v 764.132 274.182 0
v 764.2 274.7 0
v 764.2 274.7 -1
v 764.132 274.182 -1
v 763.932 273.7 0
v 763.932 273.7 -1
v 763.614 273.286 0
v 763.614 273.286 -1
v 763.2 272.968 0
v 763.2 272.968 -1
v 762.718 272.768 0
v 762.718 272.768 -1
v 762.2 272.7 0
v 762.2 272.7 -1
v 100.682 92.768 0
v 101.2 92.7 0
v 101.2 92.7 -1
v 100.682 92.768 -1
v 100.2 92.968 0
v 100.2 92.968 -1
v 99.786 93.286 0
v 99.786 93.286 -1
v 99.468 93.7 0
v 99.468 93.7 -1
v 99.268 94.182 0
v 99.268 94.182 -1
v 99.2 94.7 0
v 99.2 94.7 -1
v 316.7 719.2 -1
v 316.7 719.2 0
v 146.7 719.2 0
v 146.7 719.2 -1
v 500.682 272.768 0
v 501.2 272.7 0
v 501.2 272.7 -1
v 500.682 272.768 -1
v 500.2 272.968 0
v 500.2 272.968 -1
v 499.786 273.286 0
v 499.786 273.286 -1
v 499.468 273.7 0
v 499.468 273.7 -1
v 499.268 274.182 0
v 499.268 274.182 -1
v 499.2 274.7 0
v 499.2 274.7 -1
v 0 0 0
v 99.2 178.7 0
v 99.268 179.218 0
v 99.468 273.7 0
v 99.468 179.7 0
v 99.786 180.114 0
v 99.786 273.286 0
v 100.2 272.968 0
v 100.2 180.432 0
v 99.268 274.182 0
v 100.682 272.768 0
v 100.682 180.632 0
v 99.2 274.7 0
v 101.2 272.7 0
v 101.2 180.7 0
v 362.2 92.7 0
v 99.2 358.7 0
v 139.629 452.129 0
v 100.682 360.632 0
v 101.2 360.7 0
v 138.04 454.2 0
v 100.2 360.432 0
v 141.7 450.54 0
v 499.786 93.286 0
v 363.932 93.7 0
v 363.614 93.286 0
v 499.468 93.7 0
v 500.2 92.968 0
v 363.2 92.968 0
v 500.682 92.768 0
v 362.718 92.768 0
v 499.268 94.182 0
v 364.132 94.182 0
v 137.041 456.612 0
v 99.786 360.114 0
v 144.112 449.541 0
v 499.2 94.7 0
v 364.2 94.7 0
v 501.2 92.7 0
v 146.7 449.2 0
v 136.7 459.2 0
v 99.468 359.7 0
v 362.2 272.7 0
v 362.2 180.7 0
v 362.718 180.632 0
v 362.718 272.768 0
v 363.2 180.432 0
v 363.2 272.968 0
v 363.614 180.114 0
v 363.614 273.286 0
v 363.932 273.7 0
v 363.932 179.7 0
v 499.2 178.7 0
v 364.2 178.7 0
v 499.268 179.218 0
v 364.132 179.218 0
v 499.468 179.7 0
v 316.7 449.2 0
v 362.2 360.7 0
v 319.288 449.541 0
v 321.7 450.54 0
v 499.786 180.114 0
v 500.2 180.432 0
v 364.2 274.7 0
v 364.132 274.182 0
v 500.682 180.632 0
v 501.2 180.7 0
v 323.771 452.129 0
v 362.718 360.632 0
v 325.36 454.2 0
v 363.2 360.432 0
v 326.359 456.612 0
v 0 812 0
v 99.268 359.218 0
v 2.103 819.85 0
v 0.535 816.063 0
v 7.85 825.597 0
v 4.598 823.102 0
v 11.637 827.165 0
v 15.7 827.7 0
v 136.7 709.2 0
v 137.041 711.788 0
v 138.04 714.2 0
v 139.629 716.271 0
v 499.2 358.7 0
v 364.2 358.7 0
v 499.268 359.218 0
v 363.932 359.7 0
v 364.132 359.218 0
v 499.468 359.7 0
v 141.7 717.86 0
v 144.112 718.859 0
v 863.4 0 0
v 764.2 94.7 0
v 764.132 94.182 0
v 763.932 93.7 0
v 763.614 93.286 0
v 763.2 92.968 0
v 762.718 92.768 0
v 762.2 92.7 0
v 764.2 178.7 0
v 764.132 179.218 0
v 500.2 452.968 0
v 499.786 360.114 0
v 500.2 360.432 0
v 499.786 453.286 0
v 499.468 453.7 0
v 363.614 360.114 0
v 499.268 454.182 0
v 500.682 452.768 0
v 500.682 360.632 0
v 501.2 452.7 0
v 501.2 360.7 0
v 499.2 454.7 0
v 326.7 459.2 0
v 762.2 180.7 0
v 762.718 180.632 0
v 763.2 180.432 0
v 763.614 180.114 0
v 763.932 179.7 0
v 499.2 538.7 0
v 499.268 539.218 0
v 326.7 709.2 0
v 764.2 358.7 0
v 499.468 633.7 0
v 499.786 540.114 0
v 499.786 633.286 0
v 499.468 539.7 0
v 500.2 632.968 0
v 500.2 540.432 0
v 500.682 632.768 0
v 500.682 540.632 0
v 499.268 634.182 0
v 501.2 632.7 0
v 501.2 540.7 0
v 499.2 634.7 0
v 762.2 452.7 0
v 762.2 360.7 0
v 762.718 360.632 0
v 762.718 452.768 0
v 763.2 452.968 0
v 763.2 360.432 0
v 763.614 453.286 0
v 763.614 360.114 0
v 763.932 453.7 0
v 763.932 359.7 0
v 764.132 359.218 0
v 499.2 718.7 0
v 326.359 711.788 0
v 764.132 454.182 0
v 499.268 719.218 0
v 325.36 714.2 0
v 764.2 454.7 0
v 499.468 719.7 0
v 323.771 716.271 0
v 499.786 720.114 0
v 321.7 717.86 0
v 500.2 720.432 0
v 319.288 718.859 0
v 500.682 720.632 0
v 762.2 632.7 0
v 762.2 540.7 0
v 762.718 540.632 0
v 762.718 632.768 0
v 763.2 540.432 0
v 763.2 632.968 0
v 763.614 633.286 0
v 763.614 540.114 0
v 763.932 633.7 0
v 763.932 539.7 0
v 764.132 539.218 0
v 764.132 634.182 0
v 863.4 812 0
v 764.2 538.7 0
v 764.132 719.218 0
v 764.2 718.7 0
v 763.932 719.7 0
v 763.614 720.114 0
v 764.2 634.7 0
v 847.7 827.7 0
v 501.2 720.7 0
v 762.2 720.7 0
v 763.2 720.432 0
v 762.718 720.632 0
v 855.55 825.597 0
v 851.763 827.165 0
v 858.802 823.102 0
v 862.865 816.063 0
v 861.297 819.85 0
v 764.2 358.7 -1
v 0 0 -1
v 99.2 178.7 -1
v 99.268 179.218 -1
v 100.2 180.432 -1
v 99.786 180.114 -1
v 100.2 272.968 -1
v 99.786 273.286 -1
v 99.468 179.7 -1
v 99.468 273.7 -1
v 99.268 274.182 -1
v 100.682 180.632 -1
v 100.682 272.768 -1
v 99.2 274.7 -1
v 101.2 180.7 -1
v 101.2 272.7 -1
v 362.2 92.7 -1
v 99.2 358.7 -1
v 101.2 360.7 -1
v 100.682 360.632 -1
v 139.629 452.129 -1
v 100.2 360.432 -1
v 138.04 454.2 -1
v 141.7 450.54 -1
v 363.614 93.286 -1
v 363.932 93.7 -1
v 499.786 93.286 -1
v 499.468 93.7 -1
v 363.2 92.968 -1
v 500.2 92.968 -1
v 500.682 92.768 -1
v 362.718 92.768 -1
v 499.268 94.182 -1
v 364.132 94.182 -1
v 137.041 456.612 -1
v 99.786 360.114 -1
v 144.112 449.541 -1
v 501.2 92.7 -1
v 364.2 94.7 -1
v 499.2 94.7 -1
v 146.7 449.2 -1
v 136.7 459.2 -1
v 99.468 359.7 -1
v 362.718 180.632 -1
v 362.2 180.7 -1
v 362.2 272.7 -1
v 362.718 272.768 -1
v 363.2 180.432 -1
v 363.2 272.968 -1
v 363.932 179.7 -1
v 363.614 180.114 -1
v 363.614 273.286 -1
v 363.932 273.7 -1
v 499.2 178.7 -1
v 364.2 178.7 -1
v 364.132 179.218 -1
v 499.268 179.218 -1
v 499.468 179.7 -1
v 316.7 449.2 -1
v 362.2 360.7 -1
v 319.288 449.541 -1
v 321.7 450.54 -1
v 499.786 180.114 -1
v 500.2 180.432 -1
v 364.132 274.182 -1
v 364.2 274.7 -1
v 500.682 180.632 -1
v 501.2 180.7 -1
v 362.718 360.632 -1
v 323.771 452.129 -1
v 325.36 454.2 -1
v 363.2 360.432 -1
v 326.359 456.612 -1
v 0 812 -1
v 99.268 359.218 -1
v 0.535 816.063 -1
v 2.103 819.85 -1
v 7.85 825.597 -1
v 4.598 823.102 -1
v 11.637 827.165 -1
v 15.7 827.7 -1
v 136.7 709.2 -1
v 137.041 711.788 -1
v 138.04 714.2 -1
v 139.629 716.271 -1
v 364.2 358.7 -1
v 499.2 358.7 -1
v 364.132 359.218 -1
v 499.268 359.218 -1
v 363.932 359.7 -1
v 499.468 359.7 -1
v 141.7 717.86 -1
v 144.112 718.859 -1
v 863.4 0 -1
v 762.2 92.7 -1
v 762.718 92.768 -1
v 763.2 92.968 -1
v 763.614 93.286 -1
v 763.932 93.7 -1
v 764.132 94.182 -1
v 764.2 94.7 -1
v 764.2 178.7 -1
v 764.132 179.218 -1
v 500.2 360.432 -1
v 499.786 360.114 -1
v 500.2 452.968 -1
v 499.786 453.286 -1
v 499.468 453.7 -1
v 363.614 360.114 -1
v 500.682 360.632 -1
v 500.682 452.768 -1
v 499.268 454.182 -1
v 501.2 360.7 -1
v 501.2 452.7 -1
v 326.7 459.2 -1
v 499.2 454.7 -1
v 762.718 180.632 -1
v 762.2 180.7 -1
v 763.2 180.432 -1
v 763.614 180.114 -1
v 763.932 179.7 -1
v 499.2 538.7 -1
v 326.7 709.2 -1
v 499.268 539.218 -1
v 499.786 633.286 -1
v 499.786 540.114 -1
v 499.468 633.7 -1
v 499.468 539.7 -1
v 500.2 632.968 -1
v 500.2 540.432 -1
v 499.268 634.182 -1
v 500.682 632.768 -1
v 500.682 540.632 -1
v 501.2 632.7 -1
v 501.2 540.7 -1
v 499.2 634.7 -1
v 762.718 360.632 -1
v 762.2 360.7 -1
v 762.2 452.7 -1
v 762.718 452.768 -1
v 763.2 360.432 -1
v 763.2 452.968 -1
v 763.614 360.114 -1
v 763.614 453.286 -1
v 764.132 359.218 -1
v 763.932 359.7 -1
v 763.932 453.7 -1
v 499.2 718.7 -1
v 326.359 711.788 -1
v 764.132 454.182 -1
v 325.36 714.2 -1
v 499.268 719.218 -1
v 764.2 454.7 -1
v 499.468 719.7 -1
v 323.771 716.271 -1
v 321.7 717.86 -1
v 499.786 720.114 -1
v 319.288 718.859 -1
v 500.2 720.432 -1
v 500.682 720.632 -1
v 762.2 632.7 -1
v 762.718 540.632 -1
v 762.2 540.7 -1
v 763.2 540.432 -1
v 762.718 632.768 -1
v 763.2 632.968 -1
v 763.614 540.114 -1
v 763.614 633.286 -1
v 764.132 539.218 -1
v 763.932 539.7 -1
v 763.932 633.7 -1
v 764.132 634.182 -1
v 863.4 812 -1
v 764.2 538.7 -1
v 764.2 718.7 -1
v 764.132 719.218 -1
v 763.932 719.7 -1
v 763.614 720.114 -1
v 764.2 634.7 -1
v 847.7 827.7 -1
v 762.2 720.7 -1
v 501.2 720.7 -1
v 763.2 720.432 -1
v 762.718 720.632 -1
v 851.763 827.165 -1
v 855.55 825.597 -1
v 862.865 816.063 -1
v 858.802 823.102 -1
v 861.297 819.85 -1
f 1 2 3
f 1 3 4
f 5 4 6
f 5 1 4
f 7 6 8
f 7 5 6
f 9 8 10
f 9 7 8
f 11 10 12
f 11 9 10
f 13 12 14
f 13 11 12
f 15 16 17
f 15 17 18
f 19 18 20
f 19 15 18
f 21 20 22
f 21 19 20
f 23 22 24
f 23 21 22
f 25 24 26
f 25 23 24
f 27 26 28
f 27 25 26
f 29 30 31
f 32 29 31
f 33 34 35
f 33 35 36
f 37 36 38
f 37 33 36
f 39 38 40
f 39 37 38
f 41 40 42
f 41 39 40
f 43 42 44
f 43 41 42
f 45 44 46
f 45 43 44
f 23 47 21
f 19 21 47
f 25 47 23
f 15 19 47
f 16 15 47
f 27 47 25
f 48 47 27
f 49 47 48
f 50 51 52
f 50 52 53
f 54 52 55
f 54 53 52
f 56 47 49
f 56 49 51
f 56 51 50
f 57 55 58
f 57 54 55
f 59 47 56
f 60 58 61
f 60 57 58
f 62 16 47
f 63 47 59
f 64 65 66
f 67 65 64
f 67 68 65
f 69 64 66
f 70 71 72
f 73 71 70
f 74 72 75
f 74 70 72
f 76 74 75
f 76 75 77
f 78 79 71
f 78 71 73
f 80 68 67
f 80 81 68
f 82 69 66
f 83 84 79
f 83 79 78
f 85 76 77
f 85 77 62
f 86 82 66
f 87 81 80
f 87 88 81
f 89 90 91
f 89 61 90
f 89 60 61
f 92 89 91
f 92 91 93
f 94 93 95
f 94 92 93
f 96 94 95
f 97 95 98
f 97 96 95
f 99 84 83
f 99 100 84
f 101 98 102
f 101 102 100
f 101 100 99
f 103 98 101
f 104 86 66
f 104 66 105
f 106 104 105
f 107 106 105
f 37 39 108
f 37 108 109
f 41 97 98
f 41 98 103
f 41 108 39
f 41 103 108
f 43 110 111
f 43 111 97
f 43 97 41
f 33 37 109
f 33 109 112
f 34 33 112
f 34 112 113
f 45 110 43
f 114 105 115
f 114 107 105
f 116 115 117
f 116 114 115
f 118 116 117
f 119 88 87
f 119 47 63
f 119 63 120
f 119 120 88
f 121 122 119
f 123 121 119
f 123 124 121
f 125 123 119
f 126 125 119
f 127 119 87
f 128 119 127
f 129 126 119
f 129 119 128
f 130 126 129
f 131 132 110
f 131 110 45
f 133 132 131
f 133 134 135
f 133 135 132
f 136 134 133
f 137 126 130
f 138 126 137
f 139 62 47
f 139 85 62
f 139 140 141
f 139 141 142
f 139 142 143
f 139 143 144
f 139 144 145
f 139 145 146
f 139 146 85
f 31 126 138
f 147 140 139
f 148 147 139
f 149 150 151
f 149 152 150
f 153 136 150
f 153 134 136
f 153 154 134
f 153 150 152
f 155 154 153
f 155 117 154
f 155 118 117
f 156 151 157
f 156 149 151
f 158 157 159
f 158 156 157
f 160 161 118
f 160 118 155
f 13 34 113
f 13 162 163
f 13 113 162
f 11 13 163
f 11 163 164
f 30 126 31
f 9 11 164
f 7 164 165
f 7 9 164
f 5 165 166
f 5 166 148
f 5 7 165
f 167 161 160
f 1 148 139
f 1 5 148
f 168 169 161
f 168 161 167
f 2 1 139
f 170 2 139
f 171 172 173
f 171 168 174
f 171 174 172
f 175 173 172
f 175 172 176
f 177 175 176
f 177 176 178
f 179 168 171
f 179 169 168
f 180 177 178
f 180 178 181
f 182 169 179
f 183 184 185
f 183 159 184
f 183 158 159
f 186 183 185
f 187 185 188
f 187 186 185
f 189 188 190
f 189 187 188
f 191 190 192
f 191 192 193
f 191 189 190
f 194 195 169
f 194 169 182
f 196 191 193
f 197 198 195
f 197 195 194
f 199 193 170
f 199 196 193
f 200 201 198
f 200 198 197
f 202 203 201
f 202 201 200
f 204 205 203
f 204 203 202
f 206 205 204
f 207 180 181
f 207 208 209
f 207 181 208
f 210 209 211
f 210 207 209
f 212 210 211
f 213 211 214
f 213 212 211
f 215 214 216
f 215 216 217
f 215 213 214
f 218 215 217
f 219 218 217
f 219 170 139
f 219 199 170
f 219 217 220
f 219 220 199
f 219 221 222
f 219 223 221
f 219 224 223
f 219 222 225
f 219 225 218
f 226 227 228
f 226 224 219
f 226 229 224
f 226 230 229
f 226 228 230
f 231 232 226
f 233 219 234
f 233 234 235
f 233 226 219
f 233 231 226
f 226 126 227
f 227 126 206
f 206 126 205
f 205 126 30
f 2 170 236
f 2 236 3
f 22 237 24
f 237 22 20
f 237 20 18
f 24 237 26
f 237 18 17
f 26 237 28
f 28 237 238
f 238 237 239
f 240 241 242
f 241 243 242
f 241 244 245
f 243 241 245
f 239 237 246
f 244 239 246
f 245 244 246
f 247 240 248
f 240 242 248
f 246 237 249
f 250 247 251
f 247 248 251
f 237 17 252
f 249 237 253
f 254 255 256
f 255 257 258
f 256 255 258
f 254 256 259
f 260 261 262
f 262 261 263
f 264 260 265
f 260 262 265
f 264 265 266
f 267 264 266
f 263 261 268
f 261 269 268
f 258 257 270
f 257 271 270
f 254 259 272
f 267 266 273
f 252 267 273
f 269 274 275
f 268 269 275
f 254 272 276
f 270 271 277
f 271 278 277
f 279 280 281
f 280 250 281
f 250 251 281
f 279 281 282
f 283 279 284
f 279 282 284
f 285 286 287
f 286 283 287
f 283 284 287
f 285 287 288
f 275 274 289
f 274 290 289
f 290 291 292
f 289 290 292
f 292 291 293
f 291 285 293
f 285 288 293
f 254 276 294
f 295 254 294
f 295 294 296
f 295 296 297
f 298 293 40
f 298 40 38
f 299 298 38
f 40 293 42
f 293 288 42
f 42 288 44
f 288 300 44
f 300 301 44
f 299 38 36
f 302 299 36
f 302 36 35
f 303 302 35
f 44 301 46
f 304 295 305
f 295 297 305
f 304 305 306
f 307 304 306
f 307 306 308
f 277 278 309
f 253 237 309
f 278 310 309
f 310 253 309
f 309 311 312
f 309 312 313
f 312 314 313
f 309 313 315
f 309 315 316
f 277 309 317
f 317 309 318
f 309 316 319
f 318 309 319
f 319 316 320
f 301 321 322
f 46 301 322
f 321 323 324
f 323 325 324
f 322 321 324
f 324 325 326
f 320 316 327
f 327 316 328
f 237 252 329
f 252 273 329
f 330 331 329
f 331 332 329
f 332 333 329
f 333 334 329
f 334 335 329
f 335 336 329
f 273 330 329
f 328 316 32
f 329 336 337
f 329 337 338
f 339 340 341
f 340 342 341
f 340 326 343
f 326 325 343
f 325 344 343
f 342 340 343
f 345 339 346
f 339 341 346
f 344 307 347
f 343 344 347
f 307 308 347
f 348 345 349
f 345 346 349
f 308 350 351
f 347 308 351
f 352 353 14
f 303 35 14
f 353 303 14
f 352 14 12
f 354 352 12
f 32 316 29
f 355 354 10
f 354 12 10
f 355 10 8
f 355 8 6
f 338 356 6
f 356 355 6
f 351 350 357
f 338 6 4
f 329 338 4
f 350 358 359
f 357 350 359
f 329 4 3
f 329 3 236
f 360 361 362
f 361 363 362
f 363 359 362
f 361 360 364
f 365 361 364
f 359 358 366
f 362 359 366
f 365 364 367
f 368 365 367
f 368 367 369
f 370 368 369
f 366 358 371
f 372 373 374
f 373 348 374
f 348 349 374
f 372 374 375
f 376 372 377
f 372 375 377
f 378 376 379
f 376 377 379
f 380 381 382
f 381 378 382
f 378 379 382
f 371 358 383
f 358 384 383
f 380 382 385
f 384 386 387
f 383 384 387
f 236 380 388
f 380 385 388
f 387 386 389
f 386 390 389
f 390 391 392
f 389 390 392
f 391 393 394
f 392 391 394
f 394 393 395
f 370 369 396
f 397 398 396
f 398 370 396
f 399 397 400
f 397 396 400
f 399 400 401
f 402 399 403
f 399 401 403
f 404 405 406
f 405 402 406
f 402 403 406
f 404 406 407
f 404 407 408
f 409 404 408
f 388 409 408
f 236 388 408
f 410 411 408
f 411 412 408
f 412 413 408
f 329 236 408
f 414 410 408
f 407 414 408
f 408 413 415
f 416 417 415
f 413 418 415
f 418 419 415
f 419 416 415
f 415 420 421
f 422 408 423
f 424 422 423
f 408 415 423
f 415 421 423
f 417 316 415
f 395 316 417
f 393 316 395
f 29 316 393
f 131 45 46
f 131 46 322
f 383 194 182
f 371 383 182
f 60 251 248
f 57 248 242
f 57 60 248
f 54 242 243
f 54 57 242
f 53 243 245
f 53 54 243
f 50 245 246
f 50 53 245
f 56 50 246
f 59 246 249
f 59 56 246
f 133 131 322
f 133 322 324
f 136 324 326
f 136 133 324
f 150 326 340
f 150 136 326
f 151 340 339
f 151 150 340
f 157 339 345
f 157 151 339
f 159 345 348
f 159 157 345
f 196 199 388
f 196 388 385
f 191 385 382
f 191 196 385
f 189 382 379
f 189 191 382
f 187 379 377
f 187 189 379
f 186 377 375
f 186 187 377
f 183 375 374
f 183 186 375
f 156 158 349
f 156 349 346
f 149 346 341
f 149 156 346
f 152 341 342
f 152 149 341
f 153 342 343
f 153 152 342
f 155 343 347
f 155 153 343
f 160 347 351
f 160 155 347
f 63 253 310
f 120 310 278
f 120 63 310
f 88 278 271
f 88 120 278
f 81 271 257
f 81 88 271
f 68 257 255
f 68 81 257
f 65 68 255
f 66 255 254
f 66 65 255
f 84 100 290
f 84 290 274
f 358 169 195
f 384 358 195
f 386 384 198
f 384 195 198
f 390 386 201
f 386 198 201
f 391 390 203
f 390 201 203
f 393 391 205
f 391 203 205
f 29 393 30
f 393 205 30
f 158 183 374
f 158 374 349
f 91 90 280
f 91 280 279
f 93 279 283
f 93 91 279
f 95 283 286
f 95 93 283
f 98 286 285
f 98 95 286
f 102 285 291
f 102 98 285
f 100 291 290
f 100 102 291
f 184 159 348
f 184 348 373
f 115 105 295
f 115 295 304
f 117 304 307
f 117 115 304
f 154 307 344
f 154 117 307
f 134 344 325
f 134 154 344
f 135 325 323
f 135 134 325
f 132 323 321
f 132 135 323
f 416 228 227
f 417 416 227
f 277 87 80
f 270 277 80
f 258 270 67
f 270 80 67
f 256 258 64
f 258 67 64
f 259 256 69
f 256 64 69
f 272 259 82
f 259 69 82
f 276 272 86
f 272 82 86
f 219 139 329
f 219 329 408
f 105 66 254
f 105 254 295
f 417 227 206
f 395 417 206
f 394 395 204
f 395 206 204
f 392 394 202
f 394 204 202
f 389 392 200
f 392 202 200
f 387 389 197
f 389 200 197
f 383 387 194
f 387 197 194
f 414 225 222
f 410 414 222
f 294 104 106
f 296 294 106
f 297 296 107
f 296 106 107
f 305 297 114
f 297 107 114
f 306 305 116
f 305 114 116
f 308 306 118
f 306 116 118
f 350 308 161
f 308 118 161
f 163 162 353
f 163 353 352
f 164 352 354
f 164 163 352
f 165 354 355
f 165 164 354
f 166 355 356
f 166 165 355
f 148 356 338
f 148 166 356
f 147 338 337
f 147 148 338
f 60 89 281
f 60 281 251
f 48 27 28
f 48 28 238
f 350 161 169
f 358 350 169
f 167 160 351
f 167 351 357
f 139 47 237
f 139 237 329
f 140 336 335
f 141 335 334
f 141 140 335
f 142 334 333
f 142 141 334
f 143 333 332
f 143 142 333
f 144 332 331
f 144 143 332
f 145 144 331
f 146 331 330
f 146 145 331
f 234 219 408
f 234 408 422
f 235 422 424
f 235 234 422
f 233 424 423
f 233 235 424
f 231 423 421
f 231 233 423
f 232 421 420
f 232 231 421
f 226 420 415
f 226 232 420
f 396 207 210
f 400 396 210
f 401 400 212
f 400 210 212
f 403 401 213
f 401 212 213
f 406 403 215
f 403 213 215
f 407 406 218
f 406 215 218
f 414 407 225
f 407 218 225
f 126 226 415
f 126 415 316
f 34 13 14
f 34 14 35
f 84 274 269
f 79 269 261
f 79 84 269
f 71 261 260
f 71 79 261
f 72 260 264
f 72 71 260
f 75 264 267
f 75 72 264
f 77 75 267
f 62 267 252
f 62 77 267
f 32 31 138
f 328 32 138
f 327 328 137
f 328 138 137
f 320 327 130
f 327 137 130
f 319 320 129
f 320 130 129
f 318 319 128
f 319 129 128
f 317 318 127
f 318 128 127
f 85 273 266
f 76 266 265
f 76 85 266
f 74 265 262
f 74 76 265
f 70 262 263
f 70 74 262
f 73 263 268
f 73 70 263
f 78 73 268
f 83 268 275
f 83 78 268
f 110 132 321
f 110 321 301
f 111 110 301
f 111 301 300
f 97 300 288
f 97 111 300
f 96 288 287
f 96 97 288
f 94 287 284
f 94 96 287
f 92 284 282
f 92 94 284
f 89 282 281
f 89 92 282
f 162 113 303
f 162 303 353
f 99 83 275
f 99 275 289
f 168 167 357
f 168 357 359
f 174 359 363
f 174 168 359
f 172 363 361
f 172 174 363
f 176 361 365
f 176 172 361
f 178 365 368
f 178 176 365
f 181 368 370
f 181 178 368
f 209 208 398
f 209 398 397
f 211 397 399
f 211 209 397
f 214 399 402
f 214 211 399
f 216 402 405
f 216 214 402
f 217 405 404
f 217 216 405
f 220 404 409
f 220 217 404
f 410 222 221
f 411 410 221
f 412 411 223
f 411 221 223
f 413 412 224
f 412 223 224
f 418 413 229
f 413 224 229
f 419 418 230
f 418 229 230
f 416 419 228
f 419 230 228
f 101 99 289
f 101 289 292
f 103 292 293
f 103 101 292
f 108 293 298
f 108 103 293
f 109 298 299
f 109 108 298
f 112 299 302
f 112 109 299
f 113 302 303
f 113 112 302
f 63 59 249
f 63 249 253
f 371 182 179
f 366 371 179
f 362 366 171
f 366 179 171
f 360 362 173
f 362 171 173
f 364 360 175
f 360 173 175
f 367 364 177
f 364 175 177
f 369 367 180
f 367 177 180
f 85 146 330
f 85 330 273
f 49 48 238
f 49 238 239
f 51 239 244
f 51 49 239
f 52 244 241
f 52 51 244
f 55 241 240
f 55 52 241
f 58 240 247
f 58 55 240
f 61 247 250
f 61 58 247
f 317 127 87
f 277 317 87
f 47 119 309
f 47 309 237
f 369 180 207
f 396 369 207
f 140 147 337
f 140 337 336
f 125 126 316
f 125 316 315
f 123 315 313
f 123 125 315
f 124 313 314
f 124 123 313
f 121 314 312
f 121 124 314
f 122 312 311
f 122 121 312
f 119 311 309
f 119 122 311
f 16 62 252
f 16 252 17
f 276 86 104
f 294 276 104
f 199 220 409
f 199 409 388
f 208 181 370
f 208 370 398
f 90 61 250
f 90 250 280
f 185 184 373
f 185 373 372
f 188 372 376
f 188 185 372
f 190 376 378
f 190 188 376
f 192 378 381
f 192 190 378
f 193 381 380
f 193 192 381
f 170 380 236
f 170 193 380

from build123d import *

# Parameters (mm, degrees)
BASE_FLANGE1_DEPTH = 1
CUT_EXTRUDE1_DEPTH = 10
CUT_EXTRUDE2_DEPTH = 10


# Sheet-metal steps are written as plain solids
with BuildPart() as part:
    # Sketch1 → Base-Flange1 (new body)
    with BuildSketch(Plane.XY):
        with BuildLine():
            Line((0, 0), (863.4, 0))
            Line((863.4, 0), (863.4, 812))
            ThreePointArc((863.4, 812), (858.801576465, 823.101576465), (847.7, 827.7))
            Line((847.7, 827.7), (15.7, 827.7))
            ThreePointArc((15.7, 827.7), (4.598423535, 823.101576465), (0, 812))
            Line((0, 812), (0, 0))
        make_face()
    extrude(amount=-BASE_FLANGE1_DEPTH)

    # Sketch9 → Cut-Extrude1 (cut)
    with BuildSketch(Plane.XY):
        with BuildLine():
            Line((762.2, 720.7), (501.2, 720.7))
            ThreePointArc((501.2, 720.7), (499.785786438, 720.114213562), (499.2, 718.7))
            Line((499.2, 718.7), (499.2, 634.7))
            ThreePointArc((499.2, 634.7), (499.785786438, 633.285786438), (501.2, 632.7))
            Line((501.2, 632.7), (762.2, 632.7))
            ThreePointArc((762.2, 632.7), (763.614213562, 633.285786438), (764.2, 634.7))
            Line((764.2, 634.7), (764.2, 718.7))
            ThreePointArc((764.2, 718.7), (763.614213562, 720.114213562), (762.2, 720.7))
        make_face()
        with BuildLine():
            Line((764.2, 538.7), (764.2, 454.7))
            ThreePointArc((764.2, 454.7), (763.614213562, 453.285786438), (762.2, 452.7))
            Line((762.2, 452.7), (501.2, 452.7))
            ThreePointArc((501.2, 452.7), (499.785786438, 453.285786438), (499.2, 454.7))
            Line((499.2, 454.7), (499.2, 538.7))
            ThreePointArc((499.2, 538.7), (499.785786438, 540.114213562), (501.2, 540.7))
            Line((501.2, 540.7), (762.2, 540.7))
            ThreePointArc((762.2, 540.7), (763.614213562, 540.114213562), (764.2, 538.7))
        make_face()
        with BuildLine():
            Line((764.2, 358.7), (764.2, 274.7))
            ThreePointArc((764.2, 274.7), (763.614213562, 273.285786438), (762.2, 272.7))
            Line((762.2, 272.7), (501.2, 272.7))
            ThreePointArc((501.2, 272.7), (499.785786438, 273.285786438), (499.2, 274.7))
            Line((499.2, 274.7), (499.2, 358.7))
            ThreePointArc((499.2, 358.7), (499.785786438, 360.114213562), (501.2, 360.7))
            Line((501.2, 360.7), (762.2, 360.7))
            ThreePointArc((762.2, 360.7), (763.614213562, 360.114213562), (764.2, 358.7))
        make_face()
        with BuildLine():
            Line((764.2, 178.7), (764.2, 94.7))
            ThreePointArc((764.2, 94.7), (763.614213562, 93.285786438), (762.2, 92.7))
            Line((762.2, 92.7), (501.2, 92.7))
            ThreePointArc((501.2, 92.7), (499.785786438, 93.285786438), (499.2, 94.7))
            Line((499.2, 94.7), (499.2, 178.7))
            ThreePointArc((499.2, 178.7), (499.785786438, 180.114213562), (501.2, 180.7))
            Line((501.2, 180.7), (762.2, 180.7))
            ThreePointArc((762.2, 180.7), (763.614213562, 180.114213562), (764.2, 178.7))
        make_face()
        with BuildLine():
            Line((364.2, 358.7), (364.2, 274.7))
            ThreePointArc((364.2, 274.7), (363.614213562, 273.285786438), (362.2, 272.7))
            Line((362.2, 272.7), (101.2, 272.7))
            ThreePointArc((101.2, 272.7), (99.785786438, 273.285786438), (99.2, 274.7))
            Line((99.2, 274.7), (99.2, 358.7))
            ThreePointArc((99.2, 358.7), (99.785786438, 360.114213562), (101.2, 360.7))
            Line((101.2, 360.7), (362.2, 360.7))
            ThreePointArc((362.2, 360.7), (363.614213562, 360.114213562), (364.2, 358.7))
        make_face()
        with BuildLine():
            Line((364.2, 178.7), (364.2, 94.7))
            ThreePointArc((364.2, 94.7), (363.614213562, 93.285786438), (362.2, 92.7))
            Line((362.2, 92.7), (101.2, 92.7))
            ThreePointArc((101.2, 92.7), (99.785786438, 93.285786438), (99.2, 94.7))
            Line((99.2, 94.7), (99.2, 178.7))
            ThreePointArc((99.2, 178.7), (99.785786438, 180.114213562), (101.2, 180.7))
            Line((101.2, 180.7), (362.2, 180.7))
            ThreePointArc((362.2, 180.7), (363.614213562, 180.114213562), (364.2, 178.7))
        make_face()
    extrude(amount=-CUT_EXTRUDE1_DEPTH, mode=Mode.SUBTRACT)

    # Sketch10 → Cut-Extrude2 (cut)
    with BuildSketch(Plane.XY):
        with BuildLine():
            Line((146.7, 449.2), (316.7, 449.2))
            ThreePointArc((316.7, 449.2), (323.771067812, 452.128932188), (326.7, 459.2))
            Line((326.7, 459.2), (326.7, 709.2))
            ThreePointArc((326.7, 709.2), (323.771067812, 716.271067812), (316.7, 719.2))
            Line((316.7, 719.2), (146.7, 719.2))
            ThreePointArc((146.7, 719.2), (139.628932188, 716.271067812), (136.7, 709.2))
            Line((136.7, 709.2), (136.7, 459.2))
            ThreePointArc((136.7, 459.2), (139.628932188, 452.128932188), (146.7, 449.2))
        make_face()
    extrude(amount=-CUT_EXTRUDE2_DEPTH, mode=Mode.SUBTRACT)


solid = part.part
